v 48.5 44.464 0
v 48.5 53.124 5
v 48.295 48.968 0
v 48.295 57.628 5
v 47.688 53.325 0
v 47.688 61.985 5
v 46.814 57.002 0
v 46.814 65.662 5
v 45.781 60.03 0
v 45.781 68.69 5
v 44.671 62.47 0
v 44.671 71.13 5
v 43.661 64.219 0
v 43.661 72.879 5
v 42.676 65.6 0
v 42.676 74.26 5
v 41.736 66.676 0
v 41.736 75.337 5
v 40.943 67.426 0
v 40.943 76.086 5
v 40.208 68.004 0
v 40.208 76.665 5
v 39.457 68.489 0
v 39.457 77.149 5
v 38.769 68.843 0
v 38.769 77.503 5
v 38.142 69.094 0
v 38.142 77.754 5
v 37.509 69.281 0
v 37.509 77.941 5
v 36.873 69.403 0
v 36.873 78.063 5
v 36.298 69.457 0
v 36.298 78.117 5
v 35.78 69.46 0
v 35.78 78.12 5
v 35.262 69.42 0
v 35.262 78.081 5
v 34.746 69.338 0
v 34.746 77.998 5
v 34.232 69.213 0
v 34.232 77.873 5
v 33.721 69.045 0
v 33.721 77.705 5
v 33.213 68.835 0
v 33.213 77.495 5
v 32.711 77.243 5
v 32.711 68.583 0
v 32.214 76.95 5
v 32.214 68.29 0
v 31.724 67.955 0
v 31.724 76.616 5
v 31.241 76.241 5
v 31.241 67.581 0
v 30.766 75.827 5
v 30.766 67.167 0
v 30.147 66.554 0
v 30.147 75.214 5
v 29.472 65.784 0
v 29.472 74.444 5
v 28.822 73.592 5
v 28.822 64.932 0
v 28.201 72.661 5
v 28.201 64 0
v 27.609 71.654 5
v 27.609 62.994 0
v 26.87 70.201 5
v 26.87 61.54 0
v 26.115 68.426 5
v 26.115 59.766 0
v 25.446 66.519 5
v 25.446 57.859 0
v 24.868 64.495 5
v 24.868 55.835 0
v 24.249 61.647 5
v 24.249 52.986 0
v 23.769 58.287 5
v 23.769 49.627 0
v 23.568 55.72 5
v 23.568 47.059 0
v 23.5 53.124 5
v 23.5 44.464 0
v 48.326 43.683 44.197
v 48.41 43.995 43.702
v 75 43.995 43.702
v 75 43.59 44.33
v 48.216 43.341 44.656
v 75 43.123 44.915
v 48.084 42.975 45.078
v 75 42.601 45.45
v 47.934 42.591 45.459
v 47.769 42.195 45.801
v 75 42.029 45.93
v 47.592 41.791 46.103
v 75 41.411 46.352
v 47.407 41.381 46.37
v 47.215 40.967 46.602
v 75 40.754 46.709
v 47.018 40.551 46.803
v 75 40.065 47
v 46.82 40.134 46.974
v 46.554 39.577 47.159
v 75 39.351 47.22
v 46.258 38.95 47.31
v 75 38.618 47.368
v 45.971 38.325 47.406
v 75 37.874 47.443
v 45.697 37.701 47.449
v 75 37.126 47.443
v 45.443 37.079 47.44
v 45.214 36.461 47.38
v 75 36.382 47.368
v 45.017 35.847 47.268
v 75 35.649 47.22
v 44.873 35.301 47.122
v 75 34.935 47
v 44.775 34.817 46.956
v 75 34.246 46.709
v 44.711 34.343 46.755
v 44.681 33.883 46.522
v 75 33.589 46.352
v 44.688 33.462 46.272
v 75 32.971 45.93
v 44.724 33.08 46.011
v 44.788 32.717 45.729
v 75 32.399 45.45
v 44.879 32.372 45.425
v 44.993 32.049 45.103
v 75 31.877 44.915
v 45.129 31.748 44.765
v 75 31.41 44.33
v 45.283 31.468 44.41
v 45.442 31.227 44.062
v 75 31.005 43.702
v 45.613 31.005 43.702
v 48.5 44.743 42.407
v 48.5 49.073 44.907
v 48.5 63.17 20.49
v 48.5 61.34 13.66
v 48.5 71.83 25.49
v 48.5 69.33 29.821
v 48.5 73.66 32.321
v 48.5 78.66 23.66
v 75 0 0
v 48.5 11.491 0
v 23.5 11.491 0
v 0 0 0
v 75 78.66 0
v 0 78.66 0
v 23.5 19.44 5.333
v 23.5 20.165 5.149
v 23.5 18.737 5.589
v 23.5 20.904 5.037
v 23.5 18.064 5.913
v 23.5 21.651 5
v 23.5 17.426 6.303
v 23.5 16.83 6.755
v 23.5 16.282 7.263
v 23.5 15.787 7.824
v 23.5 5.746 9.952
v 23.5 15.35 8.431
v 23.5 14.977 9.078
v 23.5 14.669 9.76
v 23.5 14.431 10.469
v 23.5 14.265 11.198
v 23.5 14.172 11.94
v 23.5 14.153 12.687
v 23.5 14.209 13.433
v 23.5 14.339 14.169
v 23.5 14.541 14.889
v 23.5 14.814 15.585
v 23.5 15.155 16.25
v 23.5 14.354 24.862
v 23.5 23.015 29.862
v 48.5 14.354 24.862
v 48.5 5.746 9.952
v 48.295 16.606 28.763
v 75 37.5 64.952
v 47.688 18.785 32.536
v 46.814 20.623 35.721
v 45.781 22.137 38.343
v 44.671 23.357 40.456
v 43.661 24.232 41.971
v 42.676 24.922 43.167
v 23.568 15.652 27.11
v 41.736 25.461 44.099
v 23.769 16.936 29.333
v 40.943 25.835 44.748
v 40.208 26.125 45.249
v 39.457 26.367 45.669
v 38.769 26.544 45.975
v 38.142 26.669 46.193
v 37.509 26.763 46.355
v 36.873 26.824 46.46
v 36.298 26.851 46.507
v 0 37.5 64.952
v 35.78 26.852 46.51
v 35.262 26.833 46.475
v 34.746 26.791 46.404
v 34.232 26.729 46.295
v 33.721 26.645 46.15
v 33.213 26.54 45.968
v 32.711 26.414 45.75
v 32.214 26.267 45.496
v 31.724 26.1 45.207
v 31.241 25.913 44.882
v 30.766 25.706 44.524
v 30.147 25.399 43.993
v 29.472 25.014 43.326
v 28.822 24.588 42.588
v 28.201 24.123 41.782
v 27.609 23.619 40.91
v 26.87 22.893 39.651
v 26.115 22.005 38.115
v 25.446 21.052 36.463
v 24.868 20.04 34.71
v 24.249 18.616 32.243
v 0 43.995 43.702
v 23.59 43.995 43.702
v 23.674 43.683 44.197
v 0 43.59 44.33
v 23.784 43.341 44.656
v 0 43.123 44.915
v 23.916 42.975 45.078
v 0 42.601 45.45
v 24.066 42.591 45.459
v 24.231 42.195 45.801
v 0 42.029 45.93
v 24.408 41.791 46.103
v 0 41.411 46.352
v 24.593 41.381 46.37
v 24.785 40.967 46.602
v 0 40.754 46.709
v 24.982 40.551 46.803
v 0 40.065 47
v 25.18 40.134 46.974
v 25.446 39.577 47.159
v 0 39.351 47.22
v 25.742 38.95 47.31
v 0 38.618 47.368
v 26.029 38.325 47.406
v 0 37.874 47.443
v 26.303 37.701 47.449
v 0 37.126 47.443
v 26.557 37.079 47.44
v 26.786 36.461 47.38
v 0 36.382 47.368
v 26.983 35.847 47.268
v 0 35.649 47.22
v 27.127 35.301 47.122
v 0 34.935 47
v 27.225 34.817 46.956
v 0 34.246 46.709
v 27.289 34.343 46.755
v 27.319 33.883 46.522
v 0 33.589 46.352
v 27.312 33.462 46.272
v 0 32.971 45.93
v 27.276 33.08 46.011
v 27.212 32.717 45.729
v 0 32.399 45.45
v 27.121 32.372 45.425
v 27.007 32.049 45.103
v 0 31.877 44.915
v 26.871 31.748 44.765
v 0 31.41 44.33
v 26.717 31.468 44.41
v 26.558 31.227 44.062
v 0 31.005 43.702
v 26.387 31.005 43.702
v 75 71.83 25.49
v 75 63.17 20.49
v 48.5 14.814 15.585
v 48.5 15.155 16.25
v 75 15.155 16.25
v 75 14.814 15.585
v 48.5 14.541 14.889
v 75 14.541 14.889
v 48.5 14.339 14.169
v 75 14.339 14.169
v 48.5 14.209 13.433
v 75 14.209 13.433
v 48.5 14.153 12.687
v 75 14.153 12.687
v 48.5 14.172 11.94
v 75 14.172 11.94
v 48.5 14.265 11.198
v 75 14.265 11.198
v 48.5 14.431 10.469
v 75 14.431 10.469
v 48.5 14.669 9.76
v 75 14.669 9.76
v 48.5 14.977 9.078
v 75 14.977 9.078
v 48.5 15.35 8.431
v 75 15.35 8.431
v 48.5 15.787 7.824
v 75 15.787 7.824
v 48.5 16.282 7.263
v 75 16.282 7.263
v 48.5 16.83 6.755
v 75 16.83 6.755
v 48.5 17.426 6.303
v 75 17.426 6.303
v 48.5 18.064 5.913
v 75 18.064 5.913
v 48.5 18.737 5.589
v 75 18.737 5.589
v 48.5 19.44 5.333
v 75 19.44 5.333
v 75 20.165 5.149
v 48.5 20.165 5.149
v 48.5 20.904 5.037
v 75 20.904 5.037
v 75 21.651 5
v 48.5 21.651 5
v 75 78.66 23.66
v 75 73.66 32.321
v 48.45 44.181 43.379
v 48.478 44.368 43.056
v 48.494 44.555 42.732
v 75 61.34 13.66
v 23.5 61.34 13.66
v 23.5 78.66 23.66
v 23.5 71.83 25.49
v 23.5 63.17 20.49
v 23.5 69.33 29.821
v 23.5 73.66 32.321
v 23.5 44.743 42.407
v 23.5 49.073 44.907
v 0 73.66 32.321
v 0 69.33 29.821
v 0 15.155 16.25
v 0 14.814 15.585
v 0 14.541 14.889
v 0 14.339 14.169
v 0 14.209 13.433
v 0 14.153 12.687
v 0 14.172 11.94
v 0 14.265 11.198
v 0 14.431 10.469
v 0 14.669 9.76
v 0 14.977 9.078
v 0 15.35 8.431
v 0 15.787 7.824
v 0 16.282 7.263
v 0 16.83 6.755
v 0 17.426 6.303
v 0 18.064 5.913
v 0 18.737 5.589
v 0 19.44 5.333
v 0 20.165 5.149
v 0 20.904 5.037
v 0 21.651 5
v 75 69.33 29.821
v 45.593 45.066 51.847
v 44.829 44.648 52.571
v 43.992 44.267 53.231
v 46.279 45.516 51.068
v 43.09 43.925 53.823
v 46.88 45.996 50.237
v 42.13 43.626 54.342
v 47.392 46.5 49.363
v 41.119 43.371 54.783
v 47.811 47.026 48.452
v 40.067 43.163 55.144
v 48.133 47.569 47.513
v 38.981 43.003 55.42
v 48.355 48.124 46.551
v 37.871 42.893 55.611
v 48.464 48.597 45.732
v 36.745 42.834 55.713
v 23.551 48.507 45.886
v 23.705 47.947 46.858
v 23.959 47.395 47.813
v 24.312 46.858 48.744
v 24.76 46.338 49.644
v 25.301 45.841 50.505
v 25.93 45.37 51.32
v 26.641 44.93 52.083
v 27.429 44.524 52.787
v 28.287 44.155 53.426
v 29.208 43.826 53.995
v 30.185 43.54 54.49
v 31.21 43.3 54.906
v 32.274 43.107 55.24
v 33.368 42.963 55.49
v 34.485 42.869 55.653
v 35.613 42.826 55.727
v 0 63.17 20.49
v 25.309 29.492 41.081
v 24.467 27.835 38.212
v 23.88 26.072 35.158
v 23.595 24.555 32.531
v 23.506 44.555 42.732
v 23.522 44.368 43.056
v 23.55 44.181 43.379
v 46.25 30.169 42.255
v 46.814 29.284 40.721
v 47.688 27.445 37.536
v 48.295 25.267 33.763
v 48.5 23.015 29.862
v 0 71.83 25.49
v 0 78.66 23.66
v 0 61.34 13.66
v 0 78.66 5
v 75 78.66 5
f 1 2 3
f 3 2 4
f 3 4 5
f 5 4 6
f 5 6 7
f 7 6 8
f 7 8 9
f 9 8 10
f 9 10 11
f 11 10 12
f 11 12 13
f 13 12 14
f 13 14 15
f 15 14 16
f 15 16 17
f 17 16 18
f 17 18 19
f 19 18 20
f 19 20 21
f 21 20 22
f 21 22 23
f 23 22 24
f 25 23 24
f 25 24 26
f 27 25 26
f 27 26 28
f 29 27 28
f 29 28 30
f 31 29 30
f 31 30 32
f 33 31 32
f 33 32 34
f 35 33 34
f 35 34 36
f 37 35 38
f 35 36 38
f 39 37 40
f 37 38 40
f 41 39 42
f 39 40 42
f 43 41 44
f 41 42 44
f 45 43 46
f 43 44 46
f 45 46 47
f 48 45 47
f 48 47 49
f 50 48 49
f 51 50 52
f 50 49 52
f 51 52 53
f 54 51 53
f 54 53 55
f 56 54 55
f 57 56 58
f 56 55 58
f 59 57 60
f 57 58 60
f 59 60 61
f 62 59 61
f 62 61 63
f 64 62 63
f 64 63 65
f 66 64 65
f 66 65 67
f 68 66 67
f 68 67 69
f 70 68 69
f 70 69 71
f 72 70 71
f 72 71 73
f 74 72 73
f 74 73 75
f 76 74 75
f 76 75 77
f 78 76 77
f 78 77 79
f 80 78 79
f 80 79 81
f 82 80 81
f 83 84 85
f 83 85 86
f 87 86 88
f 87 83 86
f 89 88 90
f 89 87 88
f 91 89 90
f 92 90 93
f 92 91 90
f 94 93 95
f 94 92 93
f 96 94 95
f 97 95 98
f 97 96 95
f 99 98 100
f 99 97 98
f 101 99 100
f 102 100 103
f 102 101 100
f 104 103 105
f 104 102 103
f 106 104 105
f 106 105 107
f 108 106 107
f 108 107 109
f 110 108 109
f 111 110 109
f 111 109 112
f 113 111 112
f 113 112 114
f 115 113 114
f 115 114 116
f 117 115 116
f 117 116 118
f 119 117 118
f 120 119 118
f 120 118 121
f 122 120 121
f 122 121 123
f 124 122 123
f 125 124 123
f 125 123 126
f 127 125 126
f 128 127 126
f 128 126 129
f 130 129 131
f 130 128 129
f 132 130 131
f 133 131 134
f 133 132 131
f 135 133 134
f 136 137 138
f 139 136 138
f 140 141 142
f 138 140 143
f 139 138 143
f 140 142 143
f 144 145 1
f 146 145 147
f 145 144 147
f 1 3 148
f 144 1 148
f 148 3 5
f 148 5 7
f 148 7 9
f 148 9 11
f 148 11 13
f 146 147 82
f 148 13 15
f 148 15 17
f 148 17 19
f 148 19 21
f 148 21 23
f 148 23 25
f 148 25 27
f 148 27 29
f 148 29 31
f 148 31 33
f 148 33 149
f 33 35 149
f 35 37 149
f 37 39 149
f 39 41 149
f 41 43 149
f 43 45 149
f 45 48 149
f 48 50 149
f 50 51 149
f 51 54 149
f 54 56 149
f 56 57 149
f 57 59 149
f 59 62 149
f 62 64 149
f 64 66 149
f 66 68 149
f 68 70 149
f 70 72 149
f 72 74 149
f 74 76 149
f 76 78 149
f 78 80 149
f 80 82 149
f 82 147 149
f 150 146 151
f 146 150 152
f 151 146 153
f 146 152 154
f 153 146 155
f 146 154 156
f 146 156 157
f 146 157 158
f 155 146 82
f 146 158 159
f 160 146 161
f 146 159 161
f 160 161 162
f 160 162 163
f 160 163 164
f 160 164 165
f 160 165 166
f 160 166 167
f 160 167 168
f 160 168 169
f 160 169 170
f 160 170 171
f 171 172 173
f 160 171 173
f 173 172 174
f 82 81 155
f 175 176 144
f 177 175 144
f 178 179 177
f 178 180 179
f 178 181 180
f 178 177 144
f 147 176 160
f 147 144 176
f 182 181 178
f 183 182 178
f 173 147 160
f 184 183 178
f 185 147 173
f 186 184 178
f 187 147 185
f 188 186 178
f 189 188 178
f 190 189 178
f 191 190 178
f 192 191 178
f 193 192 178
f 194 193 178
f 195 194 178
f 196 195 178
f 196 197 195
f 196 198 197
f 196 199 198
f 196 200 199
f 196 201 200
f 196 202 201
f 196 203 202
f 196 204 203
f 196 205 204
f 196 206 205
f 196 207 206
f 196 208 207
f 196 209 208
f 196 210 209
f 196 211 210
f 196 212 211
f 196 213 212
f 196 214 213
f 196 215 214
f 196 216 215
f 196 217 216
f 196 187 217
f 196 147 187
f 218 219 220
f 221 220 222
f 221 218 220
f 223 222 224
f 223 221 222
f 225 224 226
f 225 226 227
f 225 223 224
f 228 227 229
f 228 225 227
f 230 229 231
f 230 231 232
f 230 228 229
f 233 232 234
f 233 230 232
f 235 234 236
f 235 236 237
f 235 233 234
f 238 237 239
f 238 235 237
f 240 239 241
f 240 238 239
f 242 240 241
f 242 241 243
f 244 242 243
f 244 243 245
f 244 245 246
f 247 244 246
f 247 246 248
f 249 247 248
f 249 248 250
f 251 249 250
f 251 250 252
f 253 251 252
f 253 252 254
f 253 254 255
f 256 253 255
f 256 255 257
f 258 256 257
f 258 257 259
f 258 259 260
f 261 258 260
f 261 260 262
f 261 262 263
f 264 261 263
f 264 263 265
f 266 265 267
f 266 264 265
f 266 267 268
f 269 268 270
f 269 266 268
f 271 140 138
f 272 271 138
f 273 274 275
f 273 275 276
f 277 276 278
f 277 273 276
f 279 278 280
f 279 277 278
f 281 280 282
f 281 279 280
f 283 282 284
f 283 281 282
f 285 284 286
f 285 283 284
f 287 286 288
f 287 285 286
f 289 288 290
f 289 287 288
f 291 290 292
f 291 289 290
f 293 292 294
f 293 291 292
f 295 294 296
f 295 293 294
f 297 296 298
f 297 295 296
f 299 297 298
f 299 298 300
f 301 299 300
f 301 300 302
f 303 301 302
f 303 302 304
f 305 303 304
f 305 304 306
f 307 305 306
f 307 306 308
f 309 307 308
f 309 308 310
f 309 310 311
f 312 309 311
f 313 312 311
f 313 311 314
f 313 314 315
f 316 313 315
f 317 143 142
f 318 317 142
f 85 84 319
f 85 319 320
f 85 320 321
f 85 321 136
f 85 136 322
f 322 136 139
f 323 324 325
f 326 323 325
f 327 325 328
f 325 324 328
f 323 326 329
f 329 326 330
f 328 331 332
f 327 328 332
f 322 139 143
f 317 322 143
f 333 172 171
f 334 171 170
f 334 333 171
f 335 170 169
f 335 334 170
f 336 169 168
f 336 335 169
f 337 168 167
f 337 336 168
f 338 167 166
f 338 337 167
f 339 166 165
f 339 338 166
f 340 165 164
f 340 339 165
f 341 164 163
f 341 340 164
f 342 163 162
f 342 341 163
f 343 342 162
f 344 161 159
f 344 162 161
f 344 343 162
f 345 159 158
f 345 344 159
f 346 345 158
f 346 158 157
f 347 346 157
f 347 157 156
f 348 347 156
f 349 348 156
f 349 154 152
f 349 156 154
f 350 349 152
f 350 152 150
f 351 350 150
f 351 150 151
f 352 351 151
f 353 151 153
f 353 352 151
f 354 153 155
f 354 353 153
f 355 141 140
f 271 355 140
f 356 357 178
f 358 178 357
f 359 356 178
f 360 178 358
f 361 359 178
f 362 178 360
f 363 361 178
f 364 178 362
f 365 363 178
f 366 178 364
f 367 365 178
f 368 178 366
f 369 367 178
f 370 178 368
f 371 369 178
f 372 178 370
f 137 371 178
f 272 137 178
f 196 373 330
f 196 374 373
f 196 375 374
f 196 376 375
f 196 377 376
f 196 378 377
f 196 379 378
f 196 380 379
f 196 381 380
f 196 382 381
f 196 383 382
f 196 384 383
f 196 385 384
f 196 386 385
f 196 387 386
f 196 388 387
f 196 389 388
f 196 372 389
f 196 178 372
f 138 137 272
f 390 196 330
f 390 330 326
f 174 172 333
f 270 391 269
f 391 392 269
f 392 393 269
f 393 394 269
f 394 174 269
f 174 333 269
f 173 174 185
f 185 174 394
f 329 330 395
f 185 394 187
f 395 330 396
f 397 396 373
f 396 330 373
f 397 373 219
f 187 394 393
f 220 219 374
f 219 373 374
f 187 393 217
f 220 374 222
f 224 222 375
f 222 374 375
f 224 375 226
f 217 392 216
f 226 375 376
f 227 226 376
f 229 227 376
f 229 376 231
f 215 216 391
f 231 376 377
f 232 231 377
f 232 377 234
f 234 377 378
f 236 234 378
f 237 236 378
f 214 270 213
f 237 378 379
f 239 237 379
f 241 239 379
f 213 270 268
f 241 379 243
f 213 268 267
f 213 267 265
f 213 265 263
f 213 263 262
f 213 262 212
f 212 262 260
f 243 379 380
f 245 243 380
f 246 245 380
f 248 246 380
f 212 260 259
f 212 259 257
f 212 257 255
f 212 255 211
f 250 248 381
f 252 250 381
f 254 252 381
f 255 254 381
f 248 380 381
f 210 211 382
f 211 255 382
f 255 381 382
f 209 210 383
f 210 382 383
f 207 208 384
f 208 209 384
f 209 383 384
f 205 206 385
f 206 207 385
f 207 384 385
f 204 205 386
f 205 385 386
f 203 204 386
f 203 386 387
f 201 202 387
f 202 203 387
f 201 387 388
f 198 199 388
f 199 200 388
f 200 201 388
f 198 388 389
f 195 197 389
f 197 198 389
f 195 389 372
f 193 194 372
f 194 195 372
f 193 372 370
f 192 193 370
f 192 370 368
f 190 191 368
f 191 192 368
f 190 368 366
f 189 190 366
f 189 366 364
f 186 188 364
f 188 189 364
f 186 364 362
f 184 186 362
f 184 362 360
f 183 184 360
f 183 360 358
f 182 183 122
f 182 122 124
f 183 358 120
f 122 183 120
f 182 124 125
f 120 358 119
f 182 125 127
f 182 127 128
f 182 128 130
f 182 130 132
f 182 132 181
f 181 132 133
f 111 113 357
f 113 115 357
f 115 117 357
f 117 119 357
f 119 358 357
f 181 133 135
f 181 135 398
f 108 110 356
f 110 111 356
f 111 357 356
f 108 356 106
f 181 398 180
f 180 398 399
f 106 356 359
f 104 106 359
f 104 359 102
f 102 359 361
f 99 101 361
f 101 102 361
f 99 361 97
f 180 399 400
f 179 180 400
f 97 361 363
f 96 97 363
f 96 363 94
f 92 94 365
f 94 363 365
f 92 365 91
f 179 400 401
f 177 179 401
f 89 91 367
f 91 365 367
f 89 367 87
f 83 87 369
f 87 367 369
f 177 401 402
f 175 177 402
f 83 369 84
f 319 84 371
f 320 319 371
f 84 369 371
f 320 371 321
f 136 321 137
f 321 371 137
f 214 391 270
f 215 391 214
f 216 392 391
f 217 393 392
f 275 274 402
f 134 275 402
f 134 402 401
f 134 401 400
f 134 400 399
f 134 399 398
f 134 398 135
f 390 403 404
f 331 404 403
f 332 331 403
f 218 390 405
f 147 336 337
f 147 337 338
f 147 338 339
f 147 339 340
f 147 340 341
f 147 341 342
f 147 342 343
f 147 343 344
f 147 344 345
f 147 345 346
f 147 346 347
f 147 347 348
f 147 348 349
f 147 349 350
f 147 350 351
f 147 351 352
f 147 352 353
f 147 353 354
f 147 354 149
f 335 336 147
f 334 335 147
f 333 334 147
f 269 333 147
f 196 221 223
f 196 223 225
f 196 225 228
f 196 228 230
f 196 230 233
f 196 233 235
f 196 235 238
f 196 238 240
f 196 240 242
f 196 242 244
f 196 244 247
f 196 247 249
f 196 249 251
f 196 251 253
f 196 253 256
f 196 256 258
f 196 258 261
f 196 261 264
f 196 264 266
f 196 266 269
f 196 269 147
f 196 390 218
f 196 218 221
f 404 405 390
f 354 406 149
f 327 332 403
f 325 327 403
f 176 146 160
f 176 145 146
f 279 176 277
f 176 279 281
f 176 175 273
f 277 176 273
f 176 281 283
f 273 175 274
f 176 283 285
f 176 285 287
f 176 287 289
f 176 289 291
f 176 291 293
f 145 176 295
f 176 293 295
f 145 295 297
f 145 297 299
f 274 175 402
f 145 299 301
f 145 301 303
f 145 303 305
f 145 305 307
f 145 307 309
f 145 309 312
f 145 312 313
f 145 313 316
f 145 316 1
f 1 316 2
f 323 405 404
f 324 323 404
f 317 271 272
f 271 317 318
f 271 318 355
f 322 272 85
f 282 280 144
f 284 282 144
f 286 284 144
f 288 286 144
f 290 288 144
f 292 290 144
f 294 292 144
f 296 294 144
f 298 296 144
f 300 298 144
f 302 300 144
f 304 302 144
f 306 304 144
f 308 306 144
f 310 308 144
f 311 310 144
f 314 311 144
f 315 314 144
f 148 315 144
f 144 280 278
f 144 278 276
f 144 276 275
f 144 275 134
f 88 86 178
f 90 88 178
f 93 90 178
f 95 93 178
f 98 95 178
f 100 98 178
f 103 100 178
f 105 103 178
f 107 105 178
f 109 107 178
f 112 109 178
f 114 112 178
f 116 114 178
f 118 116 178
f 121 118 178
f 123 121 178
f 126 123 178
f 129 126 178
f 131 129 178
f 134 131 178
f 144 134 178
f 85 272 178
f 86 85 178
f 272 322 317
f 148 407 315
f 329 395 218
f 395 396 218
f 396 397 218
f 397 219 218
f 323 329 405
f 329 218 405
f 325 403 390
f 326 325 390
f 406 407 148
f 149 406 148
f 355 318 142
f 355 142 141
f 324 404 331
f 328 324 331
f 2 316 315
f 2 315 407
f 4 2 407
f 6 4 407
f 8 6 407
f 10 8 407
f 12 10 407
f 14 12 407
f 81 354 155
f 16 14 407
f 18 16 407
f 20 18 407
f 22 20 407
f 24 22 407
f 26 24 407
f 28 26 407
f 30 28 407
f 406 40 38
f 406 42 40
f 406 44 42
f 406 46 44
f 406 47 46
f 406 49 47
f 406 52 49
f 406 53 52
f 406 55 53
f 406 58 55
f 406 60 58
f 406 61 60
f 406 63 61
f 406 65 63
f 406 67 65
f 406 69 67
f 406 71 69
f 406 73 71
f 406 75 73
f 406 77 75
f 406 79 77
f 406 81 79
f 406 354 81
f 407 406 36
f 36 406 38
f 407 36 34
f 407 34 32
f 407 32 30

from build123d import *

# Parameters (mm, degrees)
PAD_DEPTH    = 75
POCKET_DEPTH = 70


with BuildPart() as part:
    # Sketch → Pad (new body)
    with BuildSketch(Plane.YZ):
        with BuildLine():
            Line((0, 0), (37.5, 64.951905))
            Line((37.5, 64.951905), (63.169873, 20.490381))
            Line((71.830127, 25.490381), (63.169873, 20.490381))
            Line((69.330127, 29.820508), (71.830127, 25.490381))
            Line((73.660254, 32.320508), (69.330127, 29.820508))
            Line((78.660254, 23.660254), (73.660254, 32.320508))
            Line((61.339746, 13.660254), (78.660254, 23.660254))
            Line((43.995191, 43.701905), (61.339746, 13.660254))
            ThreePointArc((43.995191, 43.701905), (37.5, 47.451905), (31.004809, 43.701905))
            Line((15.155445, 16.25), (31.004809, 43.701905))
            ThreePointArc((15.155445, 16.25), (15.155445, 8.75), (21.650635, 5))
            Line((21.650635, 5), (66.339746, 5))
            Line((66.339746, 5), (78.660254, 5))
            Line((78.660254, 5), (78.660254, 0))
            Line((0, 0), (78.660254, 0))
        make_face()
    extrude(amount=PAD_DEPTH)

    # Sketch001 (on DatumPlane) → Pocket (cut)
    with BuildSketch(Plane(origin=(0, 69.240381, 39.975953), x_dir=(0, -0.5, 0.866025), z_dir=(0, 0.866025, 0.5))):
        with BuildLine():
            ThreePointArc((14.354353, 23.5), (26.854353, 36), (14.354353, 48.5))
            Line((14.354353, 48.5), (-22.231963, 48.5))
            ThreePointArc((-22.231963, 48.5), (-34.731963, 36), (-22.231963, 23.5))
            Line((-22.231963, 23.5), (14.354353, 23.5))
        make_face()
    extrude(amount=-POCKET_DEPTH, mode=Mode.SUBTRACT)


solid = part.part
